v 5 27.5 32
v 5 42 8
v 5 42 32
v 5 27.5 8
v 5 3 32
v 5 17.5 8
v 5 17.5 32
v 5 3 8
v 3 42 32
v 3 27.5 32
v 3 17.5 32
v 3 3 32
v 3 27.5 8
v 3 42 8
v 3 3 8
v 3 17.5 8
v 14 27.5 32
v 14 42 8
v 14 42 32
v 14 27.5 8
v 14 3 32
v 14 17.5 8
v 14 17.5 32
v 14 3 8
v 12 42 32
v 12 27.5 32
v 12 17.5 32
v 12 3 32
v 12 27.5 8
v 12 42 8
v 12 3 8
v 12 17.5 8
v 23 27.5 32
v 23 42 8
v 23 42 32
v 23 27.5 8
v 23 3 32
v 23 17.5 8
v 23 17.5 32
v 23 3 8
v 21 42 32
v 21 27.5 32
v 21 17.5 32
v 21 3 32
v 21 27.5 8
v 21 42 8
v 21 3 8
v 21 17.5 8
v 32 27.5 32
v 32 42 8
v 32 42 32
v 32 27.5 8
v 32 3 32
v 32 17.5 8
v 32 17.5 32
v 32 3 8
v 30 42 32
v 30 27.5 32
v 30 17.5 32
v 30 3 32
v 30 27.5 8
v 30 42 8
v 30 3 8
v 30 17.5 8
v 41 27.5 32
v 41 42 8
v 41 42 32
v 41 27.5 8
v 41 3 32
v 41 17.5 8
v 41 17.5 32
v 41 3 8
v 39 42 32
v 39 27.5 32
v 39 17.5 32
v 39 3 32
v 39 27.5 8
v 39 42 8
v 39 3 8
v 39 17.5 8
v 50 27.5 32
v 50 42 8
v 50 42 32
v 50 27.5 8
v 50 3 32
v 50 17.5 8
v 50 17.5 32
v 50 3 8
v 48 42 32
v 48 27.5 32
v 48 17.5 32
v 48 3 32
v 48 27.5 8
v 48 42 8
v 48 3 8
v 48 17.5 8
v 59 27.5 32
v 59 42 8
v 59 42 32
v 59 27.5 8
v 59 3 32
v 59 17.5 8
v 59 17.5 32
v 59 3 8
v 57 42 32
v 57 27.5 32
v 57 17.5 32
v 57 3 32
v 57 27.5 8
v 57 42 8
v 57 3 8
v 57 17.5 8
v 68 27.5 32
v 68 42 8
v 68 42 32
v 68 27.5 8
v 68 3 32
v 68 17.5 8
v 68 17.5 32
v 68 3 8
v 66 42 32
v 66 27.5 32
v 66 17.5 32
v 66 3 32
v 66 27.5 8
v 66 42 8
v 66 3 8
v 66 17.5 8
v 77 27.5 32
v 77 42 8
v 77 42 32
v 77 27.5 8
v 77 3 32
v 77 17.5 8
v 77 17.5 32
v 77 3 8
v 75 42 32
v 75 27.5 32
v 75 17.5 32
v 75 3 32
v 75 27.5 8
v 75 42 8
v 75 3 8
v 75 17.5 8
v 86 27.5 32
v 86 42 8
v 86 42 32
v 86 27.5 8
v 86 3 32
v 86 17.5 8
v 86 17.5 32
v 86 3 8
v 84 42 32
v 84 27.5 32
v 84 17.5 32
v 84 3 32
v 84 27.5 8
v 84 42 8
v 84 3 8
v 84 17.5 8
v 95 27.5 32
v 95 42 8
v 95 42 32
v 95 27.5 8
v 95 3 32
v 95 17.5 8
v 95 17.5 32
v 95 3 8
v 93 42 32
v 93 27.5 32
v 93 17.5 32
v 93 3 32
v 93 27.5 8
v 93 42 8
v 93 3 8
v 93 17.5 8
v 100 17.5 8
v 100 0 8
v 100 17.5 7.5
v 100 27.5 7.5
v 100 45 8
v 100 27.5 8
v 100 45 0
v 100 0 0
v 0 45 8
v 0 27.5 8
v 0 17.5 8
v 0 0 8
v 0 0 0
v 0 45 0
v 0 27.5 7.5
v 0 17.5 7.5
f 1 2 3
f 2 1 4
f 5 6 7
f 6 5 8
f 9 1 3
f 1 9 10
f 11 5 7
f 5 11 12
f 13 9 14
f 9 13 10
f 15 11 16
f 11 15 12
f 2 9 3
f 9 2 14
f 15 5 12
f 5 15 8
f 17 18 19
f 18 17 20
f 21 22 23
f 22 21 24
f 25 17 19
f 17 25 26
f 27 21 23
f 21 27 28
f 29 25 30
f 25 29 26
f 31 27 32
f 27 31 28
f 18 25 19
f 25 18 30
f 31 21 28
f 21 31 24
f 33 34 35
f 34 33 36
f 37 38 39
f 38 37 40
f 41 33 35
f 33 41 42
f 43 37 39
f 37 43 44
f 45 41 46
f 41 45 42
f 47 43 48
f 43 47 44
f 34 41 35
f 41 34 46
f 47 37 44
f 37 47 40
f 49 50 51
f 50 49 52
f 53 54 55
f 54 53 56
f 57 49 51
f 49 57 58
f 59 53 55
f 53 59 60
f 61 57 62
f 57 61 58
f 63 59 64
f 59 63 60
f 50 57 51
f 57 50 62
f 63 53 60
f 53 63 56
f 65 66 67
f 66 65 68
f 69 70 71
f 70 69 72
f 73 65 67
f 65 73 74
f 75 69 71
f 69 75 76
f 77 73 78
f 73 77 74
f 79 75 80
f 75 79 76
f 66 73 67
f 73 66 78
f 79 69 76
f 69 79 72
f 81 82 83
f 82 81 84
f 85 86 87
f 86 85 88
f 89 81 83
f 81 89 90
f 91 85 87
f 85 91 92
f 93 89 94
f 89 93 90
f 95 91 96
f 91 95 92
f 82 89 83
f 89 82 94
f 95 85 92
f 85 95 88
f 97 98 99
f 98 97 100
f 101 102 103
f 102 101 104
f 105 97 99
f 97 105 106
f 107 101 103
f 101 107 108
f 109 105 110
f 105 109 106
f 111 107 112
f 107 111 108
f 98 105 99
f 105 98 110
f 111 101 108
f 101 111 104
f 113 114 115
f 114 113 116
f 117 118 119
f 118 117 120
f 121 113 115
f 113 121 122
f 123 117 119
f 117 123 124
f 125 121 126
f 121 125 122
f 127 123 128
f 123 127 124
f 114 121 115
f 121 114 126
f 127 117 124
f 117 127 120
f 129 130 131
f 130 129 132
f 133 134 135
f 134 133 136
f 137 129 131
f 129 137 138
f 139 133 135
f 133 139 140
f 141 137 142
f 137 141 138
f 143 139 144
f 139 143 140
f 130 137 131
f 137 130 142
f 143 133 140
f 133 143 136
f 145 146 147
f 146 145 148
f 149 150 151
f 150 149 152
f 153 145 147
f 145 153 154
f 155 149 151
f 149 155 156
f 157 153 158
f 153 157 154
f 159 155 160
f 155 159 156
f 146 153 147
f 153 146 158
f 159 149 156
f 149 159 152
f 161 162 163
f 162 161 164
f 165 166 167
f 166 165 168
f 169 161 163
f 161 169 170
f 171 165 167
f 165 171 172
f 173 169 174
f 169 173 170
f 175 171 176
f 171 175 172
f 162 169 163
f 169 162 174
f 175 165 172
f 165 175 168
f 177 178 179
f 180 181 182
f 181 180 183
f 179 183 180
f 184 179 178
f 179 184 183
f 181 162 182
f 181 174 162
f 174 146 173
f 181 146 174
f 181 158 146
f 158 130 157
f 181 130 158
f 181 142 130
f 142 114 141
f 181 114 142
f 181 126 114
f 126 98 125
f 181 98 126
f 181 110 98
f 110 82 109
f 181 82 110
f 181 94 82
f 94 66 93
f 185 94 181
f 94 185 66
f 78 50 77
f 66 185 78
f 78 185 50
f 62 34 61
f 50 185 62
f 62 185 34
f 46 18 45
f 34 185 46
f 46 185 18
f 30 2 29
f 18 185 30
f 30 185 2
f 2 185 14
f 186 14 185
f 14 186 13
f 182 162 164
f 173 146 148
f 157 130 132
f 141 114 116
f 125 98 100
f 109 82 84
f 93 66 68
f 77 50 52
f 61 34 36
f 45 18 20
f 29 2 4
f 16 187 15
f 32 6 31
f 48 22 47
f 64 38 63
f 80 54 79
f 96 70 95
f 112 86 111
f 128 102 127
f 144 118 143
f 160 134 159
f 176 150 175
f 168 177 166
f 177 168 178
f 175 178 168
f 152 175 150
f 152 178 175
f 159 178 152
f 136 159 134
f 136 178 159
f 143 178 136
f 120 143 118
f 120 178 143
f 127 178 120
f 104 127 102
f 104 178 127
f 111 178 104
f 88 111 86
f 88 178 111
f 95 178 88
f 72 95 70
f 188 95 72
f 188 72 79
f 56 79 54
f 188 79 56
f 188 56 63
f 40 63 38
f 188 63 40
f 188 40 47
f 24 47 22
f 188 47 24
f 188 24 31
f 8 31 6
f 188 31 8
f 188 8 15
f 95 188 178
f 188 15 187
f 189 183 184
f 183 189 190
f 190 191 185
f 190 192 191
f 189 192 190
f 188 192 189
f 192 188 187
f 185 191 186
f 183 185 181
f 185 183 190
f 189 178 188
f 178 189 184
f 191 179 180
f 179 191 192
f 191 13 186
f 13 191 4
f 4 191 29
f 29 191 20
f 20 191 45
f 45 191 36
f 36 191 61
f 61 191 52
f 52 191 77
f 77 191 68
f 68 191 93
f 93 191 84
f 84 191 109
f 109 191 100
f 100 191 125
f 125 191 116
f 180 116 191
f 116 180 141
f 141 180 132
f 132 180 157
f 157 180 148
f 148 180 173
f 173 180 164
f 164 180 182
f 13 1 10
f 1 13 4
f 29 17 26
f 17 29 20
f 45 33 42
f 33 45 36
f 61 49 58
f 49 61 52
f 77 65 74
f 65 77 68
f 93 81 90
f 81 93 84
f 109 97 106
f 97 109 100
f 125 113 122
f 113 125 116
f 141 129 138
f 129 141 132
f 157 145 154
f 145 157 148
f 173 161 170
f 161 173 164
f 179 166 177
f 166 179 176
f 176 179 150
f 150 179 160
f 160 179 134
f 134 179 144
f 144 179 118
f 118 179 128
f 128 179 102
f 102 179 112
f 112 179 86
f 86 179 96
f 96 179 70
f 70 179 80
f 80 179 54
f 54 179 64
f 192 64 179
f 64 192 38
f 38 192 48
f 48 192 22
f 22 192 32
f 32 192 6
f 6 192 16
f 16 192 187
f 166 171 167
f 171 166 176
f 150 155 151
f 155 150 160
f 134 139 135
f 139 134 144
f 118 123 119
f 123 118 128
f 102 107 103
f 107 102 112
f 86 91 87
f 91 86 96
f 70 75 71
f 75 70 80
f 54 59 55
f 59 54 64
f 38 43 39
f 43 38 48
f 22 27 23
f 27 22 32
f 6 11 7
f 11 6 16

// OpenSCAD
$fn = 32;

// ----------------------------------------------------------------------
// Heatsink: slotted fin block
// ----------------------------------------------------------------------

// --- parameters (mm) ---
base_l = 100;             // base length, X
base_w = 45;              // base width, Y
base_t = 8;               // base plate thickness
fin_h = 25;               // fin height above the base
fin_t = 2;                // fin thickness
edge = 3;                 // margin from the base ends
pitch = 9;                // fin pitch
slot_w = 10;              // central slot width, Y

n_fins = floor((base_l - 2 * edge - fin_t) / pitch) + 1;  // fin count
total_h = base_t + fin_h - 1;  // overall height

difference() {
union() {
  cube([base_l, base_w, base_t]);
  for (i = [0 : n_fins - 1])
    translate([edge + i * pitch, edge, base_t - 1])
      cube([fin_t, base_w - 2 * edge, fin_h]);
}
  translate([-1, base_w / 2 - slot_w / 2, base_t - 0.5])
    cube([base_l + 2, slot_w, fin_h + 2]);
}
